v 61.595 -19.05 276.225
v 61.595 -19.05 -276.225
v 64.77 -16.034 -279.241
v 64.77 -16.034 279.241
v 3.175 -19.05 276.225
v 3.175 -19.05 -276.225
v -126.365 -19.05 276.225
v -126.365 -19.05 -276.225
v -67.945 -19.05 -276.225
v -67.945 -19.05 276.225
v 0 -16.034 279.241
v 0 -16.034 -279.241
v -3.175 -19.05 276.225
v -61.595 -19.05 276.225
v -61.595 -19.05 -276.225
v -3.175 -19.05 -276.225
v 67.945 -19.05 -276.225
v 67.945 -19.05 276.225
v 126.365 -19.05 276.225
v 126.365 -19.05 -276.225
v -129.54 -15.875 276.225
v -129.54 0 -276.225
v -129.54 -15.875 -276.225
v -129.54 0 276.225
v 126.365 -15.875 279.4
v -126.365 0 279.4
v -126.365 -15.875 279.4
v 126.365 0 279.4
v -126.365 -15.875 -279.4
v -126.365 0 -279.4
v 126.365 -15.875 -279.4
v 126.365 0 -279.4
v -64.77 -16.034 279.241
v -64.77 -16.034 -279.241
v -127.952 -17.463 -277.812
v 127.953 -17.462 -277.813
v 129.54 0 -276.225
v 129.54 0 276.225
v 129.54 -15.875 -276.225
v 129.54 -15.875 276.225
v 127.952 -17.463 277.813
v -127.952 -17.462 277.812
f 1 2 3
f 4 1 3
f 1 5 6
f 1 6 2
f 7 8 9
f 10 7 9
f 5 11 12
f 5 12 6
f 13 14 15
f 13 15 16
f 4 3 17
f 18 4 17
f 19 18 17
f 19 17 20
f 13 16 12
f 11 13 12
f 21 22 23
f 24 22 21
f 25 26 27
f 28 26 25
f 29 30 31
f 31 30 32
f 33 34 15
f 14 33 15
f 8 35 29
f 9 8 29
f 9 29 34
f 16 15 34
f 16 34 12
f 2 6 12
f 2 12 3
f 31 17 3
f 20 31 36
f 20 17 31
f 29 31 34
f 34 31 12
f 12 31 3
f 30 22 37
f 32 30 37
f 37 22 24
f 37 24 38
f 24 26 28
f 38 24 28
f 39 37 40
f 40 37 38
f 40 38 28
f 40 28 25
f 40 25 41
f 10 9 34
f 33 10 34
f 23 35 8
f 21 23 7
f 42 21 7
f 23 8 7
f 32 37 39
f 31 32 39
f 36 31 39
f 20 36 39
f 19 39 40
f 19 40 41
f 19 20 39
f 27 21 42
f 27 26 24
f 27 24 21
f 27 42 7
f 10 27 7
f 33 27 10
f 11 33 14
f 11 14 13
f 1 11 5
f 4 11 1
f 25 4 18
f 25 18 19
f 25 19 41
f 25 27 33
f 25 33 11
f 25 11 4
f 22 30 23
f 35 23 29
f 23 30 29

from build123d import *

# Parameters (mm, degrees)
F0_W       = 259.08
F0_H       = 558.8
F1_DEPTH   = 19.05
F3_DEPTH   = 558.801
F4_C1_SIZE = 3.175
F4_C2_SIZE = 3.175
F4_C3_SIZE = 3.175
F5_SIZE    = 3.175
F6_SIZE    = 3.175


# Not quite as in the source:
# - a feature names something its author has since deleted; it is built from what else it names


with BuildPart() as f1:
    # F0 (on Front) → F1 (new body)
    with BuildSketch(Plane.XZ):
        Rectangle(F0_W, F0_H)
    extrude(amount=F1_DEPTH)

    # F2 (on face) → F3 (cut, through all)
    with BuildSketch(Plane(origin=(0, 0, -279.4), x_dir=(1, 0, 0), z_dir=(0, 0, -1))):
        Polygon((-64.77, 19.05), (-67.945, 19.05), (-64.77, 16.0336531699), (-61.595, 19.05), align=None)
        Polygon((0, 16.0336531699), (3.175, 19.05), (0, 19.05), (-3.175, 19.05), align=None)
        Polygon((64.77, 16.0336531699), (67.945, 19.05), (64.77, 19.05), (61.595, 19.05), align=None)
    extrude(amount=-F3_DEPTH, mode=Mode.SUBTRACT)

    # F4: chamfer of 3.175 on 4 edges, made by hand

    # F4_c1
    f4_c1_edges = [f1.edges().sort_by_distance(p)[0] for p in [
        (-98.7425, -19.05, -279.4),
    ]]
    chamfer(f4_c1_edges, length=F4_C1_SIZE)

    # F4_c2
    f4_c2_edges = [f1.edges().sort_by_distance(p)[0] for p in [
        (-98.7425, -19.05, 279.4),
    ]]
    chamfer(f4_c2_edges, length=F4_C2_SIZE)

    # F4_c3
    f4_c3_edges = [f1.edges().sort_by_distance(p)[0] for p in [
        (-129.54, -19.05, 0),
    ]]
    chamfer(f4_c3_edges, length=F4_C3_SIZE)

    # F5
    f5_edges = [f1.edges().sort_by_distance(p)[0] for p in [
        (-129.54, -7.9375, 279.4),
        (129.54, -7.9375, 279.4),
        (129.54, -7.9375, -279.4),
        (-129.54, -7.9375, -279.4),
    ]]
    chamfer(f5_edges, length=F5_SIZE)

    # F6
    f6_edges = [f1.edges().sort_by_distance(p)[0] for p in [
        (129.54, -19.05, 0),
    ]]
    chamfer(f6_edges, length=F6_SIZE)


solid = f1.part
